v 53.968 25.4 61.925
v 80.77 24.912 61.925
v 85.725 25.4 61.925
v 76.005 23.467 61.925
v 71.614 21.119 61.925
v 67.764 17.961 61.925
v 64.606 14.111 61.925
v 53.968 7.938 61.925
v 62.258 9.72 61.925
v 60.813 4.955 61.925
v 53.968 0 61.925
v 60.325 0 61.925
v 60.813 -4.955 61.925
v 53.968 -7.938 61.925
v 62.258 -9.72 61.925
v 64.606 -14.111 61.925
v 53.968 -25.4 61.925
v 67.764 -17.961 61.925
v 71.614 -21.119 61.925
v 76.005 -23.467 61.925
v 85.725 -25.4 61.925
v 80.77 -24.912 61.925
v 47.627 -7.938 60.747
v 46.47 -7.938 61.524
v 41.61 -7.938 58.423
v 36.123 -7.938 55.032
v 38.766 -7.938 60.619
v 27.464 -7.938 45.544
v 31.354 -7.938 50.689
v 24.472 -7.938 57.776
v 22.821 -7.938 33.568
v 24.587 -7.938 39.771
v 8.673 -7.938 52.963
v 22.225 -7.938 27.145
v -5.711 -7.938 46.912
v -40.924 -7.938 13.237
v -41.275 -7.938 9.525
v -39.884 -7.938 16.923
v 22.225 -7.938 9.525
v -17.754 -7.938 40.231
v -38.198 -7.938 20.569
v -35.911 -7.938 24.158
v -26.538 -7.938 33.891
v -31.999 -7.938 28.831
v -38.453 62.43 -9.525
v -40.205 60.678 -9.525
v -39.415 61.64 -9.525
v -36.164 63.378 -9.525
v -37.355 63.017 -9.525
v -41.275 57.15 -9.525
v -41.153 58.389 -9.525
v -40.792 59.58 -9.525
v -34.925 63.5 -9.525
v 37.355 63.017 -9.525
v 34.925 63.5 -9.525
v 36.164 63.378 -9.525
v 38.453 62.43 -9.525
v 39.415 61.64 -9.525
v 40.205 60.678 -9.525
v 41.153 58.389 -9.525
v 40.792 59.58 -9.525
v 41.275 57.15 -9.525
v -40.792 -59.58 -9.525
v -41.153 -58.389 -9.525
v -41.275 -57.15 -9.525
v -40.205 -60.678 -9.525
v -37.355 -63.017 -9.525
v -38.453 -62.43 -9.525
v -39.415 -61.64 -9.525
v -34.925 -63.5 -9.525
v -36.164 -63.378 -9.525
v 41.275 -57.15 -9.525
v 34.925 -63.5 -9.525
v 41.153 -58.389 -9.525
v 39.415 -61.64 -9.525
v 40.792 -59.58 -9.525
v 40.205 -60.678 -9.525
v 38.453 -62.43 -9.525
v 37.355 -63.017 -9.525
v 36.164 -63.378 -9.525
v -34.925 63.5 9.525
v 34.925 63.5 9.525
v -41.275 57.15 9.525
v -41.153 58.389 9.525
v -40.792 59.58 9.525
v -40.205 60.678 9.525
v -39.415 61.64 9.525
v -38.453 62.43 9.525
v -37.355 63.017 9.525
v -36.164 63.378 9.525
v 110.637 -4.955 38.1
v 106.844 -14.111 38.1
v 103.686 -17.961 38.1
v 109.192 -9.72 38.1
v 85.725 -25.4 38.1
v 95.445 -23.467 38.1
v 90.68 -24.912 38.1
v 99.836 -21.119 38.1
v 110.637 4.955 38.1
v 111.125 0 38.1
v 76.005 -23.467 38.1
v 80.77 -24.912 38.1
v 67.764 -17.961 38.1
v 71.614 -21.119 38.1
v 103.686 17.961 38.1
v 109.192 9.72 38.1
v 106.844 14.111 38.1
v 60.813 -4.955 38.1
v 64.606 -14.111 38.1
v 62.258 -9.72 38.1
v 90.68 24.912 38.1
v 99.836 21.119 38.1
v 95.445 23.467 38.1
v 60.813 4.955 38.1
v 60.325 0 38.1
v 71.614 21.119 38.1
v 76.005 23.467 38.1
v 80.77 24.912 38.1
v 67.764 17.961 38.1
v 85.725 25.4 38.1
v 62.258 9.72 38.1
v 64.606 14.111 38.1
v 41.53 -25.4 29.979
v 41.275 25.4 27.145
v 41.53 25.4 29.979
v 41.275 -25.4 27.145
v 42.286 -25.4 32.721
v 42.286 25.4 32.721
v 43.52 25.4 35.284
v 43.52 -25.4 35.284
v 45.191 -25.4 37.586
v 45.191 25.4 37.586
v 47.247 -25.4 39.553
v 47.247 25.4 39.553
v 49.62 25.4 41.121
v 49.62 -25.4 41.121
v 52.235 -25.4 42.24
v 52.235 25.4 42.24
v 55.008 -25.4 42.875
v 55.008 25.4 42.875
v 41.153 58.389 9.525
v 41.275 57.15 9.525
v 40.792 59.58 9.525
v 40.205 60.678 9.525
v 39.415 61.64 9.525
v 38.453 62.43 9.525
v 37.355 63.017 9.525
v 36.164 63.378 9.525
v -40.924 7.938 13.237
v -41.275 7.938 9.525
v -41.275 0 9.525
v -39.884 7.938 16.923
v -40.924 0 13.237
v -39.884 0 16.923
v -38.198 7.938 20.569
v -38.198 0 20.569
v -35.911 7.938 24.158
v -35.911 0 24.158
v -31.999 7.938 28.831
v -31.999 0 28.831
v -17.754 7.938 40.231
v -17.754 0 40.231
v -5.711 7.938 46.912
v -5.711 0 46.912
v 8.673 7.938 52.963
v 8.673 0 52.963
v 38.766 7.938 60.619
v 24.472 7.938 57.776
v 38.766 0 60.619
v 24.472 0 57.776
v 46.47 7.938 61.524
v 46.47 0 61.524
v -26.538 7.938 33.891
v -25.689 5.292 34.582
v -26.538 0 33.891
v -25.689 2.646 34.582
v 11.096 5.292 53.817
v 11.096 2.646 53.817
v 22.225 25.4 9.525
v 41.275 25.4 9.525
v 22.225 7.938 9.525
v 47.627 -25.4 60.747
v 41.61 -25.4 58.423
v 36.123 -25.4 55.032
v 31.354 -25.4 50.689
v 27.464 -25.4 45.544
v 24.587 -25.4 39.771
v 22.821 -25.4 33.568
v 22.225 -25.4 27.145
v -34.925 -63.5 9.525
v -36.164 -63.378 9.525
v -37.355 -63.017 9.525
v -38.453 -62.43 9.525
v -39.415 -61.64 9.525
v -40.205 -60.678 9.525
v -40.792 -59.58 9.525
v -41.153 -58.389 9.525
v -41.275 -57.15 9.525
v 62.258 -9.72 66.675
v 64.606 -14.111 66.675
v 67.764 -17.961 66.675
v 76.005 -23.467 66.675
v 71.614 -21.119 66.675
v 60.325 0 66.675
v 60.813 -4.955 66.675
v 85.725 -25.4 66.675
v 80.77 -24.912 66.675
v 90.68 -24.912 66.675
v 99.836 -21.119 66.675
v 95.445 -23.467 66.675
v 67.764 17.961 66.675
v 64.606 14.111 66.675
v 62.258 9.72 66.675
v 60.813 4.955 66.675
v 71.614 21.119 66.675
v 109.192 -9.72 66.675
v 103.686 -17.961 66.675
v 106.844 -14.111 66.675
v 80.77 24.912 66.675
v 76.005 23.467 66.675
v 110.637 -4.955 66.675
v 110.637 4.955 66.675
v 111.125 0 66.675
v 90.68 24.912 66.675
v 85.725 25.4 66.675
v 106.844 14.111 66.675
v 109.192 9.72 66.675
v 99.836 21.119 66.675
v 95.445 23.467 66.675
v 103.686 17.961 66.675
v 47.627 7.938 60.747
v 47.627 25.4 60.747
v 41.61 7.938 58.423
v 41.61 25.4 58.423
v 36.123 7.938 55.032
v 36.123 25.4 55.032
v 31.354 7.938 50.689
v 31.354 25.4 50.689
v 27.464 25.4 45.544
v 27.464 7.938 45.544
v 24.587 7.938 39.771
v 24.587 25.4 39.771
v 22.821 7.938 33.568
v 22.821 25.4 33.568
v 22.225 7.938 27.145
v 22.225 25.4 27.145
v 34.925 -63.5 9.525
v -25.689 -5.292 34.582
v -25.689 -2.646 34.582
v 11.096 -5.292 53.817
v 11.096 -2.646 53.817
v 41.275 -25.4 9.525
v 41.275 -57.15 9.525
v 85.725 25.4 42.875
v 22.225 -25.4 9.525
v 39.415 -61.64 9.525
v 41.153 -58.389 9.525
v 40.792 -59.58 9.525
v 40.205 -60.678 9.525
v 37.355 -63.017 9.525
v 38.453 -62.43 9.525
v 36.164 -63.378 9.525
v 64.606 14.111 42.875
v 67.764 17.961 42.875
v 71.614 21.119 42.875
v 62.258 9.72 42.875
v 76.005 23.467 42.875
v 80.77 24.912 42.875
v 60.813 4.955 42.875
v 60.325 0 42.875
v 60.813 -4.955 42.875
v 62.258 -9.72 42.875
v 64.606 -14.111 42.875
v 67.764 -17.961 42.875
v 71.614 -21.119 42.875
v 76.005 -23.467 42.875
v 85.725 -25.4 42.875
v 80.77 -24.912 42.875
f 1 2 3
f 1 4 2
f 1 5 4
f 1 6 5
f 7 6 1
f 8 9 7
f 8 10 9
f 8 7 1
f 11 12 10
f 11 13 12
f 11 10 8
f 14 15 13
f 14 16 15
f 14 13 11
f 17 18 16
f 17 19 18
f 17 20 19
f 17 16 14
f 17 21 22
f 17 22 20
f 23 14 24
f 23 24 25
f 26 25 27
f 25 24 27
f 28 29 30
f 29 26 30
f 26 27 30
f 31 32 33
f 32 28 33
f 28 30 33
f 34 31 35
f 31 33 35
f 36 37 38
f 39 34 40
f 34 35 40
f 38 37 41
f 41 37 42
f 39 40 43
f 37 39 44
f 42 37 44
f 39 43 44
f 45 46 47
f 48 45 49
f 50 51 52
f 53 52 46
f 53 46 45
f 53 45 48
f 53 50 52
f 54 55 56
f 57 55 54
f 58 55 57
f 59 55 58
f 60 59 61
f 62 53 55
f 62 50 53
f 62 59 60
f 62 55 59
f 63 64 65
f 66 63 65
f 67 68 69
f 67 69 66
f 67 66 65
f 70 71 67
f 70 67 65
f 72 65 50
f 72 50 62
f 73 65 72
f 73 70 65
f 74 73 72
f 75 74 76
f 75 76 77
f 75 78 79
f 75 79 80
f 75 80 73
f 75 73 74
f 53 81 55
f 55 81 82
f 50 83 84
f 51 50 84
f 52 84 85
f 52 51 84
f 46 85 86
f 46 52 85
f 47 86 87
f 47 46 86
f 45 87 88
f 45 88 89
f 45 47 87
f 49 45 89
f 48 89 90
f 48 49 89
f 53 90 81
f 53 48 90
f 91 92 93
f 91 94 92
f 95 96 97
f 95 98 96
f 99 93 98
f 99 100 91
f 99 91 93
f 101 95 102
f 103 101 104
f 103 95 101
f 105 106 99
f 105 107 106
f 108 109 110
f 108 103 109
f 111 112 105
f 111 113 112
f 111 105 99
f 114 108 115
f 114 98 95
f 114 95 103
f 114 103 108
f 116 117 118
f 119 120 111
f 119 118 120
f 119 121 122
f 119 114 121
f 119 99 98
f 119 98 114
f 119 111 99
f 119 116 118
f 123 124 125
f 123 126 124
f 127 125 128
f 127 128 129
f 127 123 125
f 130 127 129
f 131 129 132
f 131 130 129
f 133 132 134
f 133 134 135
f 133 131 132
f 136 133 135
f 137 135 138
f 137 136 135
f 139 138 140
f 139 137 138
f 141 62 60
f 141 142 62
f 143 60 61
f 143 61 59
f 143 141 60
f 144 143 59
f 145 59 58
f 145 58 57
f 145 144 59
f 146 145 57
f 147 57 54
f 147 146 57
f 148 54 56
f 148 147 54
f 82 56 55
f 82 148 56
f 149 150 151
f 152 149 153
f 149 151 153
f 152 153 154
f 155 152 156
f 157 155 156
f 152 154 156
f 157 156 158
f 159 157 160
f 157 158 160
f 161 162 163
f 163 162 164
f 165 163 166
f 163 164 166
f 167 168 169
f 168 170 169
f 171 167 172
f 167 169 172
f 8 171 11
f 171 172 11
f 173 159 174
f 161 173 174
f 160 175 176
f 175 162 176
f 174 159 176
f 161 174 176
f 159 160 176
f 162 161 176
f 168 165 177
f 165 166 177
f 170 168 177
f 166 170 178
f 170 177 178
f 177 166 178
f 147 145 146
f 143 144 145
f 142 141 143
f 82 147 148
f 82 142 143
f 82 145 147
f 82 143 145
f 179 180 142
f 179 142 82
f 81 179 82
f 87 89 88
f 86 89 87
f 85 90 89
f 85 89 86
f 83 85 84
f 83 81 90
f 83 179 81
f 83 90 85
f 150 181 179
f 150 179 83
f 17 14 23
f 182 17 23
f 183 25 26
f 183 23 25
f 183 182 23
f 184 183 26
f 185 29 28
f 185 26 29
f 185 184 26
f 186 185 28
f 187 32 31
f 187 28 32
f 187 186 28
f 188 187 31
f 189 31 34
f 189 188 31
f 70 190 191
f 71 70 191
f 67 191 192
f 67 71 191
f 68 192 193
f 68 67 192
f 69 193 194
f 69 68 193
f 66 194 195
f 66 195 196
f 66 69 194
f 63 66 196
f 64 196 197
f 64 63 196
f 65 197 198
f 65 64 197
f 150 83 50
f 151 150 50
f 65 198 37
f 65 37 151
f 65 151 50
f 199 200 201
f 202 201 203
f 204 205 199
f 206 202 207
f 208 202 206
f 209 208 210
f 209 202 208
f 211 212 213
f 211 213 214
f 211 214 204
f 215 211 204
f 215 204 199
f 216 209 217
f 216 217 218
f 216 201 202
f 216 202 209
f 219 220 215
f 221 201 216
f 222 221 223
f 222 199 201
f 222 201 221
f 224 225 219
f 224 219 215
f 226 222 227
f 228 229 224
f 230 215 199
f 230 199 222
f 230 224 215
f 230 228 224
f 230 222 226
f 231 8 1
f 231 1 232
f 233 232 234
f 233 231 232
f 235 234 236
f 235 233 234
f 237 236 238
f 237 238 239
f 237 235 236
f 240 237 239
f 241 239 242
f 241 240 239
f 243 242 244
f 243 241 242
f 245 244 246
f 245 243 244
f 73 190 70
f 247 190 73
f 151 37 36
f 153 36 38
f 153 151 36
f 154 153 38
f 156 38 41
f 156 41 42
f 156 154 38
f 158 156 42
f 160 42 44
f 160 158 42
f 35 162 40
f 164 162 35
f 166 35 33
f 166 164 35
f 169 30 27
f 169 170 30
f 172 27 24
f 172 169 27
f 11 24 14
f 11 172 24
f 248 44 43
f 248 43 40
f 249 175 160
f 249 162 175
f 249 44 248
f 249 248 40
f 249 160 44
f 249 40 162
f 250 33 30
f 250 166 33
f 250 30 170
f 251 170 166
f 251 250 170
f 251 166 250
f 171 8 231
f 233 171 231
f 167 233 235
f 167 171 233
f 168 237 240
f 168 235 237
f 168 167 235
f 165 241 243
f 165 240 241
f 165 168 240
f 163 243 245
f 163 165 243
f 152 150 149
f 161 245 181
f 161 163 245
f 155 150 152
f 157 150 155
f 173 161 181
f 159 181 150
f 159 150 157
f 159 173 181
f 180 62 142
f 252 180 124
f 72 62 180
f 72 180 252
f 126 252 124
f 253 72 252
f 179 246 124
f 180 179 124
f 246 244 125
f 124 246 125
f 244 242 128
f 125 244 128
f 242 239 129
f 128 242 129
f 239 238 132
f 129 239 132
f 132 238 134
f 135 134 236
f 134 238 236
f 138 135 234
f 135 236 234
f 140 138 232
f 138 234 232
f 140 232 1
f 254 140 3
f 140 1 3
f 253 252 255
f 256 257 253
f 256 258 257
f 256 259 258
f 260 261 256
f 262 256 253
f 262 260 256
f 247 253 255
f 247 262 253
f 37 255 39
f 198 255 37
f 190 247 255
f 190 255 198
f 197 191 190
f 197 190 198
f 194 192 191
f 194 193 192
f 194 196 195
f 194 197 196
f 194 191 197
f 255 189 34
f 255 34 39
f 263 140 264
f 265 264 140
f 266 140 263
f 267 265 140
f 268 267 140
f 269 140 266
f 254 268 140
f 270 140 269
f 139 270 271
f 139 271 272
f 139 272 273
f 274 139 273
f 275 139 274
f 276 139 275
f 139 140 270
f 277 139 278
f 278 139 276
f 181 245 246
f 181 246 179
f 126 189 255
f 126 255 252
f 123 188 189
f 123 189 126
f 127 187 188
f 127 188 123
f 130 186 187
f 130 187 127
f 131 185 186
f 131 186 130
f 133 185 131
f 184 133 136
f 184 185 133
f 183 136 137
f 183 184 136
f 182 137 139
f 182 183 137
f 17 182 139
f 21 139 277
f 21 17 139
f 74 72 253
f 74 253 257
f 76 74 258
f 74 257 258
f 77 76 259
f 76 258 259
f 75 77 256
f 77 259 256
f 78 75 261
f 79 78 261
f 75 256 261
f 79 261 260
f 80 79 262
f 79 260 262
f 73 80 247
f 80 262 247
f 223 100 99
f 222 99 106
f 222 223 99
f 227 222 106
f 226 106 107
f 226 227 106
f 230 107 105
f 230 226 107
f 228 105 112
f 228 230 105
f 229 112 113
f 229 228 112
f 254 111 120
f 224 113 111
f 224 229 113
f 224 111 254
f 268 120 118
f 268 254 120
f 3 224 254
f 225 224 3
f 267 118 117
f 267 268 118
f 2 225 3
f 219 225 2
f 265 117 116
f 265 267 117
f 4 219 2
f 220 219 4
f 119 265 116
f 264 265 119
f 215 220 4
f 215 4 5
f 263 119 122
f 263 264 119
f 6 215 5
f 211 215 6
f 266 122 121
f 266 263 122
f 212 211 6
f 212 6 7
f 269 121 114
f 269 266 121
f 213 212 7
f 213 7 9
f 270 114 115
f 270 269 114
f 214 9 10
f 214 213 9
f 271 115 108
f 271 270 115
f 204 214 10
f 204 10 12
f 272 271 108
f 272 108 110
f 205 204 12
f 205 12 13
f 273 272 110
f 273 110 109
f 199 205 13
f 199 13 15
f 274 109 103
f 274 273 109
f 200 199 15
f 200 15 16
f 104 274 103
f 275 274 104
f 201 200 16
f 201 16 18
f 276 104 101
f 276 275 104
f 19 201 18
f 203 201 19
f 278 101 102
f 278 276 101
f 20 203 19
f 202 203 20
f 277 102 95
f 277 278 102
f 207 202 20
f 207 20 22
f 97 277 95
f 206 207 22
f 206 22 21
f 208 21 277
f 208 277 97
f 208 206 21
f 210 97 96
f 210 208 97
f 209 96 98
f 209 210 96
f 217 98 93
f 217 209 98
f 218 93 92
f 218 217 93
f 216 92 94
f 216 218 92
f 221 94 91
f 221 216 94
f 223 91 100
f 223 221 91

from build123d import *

# Parameters (mm, degrees)
F1_DEPTH = 63.5
F0_W     = 25.4
F0_H     = 19.05
F2_DEPTH = 25.4
F3_DEPTH = 7.9375
F5_R     = 6.35


with BuildPart() as f1:
    # F0 (on Front) → F1 (new body, symmetric)
    with BuildSketch(Plane.XZ):
        Polygon((22.225, 9.525), (-41.275, 9.525), (-41.275, -9.525), (41.275, -9.525), (41.275, 9.525), align=None)
    extrude(amount=F1_DEPTH, both=True)

    # F0 (on Front) → F2 (join, symmetric)
    with BuildSketch(Plane.XZ):
        with Locations((73.025, 52.4002)):
            Rectangle(F0_W, F0_H)
        with BuildLine():
            Line((22.225, 27.1454148694), (22.225, 9.525))
            Line((22.225, 9.525), (41.275, 9.525))
            Line((41.275, 9.525), (41.275, 27.1454148694))
            ThreePointArc((41.275, 27.1454148694), (45.1912214489, 37.5858765721), (55.0076917247, 42.8752))
            Line((55.0076917247, 42.8752), (60.325, 42.8752))
            Line((60.325, 42.8752), (60.325, 61.9252))
            Line((60.325, 61.9252), (53.9684640074, 61.9252))
            ThreePointArc((53.9684640074, 61.9252), (31.3539657162, 50.6894213303), (22.225, 27.1454148694))
        make_face()
    extrude(amount=F2_DEPTH, both=True)

    # F0 (on Front) → F3 (join, symmetric)
    with BuildSketch(Plane.XZ):
        with BuildLine():
            add(Edge.make_bspline(
                [(-41.275, 9.525), (-41.3264594972, 35.7253178954), (13.0891343579, 61.1484050751), (53.9684640074, 61.9252)],
                knots=[0, 0, 0, 0, 108.7064781702, 108.7064781702, 108.7064781702, 108.7064781702], degree=3))
            Line((-41.275, 9.525), (22.225, 9.525))
            Line((22.225, 9.525), (22.225, 27.1454148694))
            ThreePointArc((22.225, 27.1454148694), (31.3539657162, 50.6894213303), (53.9684640074, 61.9252))
        make_face()
    extrude(amount=F3_DEPTH, both=True)

    # F0 (on Front) → F4 (revolve)
    with BuildSketch(Plane.XZ):
        Polygon((85.725, 66.675), (85.725, 61.9252), (85.725, 42.8752), (85.725, 38.1), (111.125, 38.1), (111.125, 66.675), align=None)
    revolve(axis=Axis((85.725, 0, 52.3875), (0, 0, 1)))

    # F5
    f5_edges = [f1.edges().sort_by_distance(p)[0] for p in [
        (41.275, -63.5, 0),
        (-41.275, -63.5, 0),
        (41.275, 63.5, 0),
        (-41.275, 63.5, 0),
    ]]
    fillet(f5_edges, radius=F5_R)


solid = f1.part
